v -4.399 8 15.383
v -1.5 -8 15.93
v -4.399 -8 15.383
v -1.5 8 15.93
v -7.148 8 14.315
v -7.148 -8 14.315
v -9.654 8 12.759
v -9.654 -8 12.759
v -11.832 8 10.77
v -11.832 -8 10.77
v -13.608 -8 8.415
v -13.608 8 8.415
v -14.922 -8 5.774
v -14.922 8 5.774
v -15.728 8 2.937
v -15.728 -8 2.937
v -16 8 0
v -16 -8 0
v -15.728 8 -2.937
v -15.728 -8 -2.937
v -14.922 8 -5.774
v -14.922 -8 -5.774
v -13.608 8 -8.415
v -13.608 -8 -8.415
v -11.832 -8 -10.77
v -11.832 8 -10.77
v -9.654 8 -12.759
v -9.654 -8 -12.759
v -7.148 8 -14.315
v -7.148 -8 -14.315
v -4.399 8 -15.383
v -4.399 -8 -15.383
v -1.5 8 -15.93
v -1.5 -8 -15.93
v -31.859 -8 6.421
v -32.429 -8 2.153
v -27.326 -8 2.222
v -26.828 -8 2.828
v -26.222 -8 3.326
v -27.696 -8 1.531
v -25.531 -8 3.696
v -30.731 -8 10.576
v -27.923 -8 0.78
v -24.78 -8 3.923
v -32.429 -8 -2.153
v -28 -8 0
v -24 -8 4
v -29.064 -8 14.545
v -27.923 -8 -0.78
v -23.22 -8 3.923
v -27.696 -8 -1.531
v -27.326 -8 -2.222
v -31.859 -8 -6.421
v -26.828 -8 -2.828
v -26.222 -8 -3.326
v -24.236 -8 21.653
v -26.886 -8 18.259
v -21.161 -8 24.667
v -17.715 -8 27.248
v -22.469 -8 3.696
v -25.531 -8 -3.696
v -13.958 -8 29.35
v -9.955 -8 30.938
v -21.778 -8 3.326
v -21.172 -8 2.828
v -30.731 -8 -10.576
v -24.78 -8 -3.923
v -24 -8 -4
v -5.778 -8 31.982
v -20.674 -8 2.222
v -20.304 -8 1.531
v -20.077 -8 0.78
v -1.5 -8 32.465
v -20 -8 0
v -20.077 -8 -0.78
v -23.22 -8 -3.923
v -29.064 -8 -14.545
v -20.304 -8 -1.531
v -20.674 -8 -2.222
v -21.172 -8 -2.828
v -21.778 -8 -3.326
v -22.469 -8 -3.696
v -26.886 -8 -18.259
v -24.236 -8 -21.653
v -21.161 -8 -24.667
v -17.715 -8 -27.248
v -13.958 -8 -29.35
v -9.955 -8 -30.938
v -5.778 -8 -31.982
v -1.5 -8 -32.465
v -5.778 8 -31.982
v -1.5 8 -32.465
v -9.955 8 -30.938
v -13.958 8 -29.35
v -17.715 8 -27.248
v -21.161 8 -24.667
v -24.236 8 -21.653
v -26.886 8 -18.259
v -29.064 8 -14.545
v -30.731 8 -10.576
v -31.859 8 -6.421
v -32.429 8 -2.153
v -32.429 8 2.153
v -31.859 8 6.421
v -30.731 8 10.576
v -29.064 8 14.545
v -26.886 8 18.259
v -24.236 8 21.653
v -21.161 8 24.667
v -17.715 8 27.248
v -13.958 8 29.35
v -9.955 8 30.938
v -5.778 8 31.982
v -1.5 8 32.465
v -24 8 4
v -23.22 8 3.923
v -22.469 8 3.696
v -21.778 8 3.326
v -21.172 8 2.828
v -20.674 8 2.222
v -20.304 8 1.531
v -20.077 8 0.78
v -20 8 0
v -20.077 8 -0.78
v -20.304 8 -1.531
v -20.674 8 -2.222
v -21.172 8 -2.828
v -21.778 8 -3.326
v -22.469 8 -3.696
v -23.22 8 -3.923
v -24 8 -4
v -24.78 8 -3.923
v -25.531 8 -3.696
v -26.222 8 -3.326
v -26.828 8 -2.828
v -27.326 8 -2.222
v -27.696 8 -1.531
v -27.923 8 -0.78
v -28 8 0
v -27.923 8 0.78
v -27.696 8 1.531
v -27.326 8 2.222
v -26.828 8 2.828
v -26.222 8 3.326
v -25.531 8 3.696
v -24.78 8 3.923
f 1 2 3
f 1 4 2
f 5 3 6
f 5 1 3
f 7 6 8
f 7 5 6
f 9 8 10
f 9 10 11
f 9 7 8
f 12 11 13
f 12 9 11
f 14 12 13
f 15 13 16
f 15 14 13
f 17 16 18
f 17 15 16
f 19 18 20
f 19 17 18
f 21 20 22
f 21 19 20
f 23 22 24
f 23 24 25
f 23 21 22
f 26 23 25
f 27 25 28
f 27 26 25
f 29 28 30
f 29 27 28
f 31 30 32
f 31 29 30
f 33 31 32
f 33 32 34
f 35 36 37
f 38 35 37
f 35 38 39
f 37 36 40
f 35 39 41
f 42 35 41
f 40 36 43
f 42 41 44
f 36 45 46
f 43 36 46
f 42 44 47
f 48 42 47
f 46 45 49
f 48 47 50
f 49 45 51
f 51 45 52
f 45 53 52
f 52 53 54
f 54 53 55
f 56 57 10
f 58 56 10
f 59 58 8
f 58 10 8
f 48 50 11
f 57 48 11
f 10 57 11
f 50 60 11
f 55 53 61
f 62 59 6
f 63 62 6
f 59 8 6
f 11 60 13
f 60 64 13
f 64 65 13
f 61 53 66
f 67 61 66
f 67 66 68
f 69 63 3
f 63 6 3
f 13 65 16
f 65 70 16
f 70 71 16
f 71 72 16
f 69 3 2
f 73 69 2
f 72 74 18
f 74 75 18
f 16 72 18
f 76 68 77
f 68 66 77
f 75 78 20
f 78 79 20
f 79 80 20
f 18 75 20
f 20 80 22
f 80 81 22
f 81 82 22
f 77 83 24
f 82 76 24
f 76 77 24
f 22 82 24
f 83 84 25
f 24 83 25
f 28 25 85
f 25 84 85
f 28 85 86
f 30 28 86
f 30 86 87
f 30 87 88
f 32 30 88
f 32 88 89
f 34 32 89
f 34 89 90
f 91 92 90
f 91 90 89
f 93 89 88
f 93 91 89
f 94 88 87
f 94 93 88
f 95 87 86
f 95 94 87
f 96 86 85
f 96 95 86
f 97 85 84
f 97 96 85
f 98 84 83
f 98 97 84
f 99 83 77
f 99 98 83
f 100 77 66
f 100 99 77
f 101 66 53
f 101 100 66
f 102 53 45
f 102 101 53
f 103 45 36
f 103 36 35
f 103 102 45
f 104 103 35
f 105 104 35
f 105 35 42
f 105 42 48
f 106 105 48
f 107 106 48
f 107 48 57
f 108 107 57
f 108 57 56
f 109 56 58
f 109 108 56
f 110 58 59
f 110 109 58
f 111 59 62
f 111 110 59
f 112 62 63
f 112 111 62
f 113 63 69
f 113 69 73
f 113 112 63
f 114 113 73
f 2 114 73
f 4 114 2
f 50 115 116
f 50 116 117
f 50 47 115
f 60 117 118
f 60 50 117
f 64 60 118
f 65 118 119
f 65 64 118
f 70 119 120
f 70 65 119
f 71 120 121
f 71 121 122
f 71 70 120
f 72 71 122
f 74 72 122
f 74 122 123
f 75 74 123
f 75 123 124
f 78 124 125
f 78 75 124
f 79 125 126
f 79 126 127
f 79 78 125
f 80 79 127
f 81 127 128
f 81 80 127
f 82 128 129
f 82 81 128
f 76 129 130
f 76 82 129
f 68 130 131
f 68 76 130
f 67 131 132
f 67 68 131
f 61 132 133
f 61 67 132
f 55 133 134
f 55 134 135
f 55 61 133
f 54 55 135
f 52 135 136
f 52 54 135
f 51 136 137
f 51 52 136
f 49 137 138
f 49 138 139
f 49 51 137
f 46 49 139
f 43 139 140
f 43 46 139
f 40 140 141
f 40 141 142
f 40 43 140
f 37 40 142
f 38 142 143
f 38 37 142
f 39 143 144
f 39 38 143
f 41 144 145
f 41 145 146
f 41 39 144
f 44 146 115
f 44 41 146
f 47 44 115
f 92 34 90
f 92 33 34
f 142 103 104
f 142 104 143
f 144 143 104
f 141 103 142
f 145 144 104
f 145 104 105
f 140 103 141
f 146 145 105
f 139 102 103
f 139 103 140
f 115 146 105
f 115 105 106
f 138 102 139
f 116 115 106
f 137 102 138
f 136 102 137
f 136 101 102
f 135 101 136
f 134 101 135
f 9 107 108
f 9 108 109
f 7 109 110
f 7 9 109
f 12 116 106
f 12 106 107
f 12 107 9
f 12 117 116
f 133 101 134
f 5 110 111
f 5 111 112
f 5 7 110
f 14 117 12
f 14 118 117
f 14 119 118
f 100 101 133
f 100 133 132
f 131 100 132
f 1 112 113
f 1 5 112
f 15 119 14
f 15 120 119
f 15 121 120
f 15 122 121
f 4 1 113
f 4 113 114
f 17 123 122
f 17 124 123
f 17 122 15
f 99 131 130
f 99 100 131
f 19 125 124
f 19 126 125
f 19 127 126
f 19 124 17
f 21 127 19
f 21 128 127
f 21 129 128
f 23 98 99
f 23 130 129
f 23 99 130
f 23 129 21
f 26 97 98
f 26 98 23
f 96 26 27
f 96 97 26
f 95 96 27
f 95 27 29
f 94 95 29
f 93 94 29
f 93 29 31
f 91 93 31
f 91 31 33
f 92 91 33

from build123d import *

# Parameters (mm, degrees)
SKETCH2_R           = 4
BOSS_EXTRUDE2_DEPTH = 8


with BuildPart() as part:
    # Sketch2 → Boss-Extrude2 (new, symmetric)
    with BuildSketch(Plane(origin=(0, 0, 0), x_dir=(1, 0, 0), z_dir=(0, 1, 0))):
        with BuildLine():
            Line((-1.5, 15.929532322), (-1.5, 32.465366161))
            ThreePointArc((-1.5, 32.465366161), (-32.5, 0), (-1.5, -32.465366161))
            Line((-1.5, -32.465366161), (-1.5, -15.929532322))
            ThreePointArc((-1.5, -15.929532322), (-16, 0), (-1.5, 15.929532322))
        make_face()
        with Locations(Location((-24, 0, 0), (0, 0, 270))):
            Circle(SKETCH2_R, mode=Mode.SUBTRACT)
    extrude(amount=BOSS_EXTRUDE2_DEPTH, both=True)


solid = part.part
